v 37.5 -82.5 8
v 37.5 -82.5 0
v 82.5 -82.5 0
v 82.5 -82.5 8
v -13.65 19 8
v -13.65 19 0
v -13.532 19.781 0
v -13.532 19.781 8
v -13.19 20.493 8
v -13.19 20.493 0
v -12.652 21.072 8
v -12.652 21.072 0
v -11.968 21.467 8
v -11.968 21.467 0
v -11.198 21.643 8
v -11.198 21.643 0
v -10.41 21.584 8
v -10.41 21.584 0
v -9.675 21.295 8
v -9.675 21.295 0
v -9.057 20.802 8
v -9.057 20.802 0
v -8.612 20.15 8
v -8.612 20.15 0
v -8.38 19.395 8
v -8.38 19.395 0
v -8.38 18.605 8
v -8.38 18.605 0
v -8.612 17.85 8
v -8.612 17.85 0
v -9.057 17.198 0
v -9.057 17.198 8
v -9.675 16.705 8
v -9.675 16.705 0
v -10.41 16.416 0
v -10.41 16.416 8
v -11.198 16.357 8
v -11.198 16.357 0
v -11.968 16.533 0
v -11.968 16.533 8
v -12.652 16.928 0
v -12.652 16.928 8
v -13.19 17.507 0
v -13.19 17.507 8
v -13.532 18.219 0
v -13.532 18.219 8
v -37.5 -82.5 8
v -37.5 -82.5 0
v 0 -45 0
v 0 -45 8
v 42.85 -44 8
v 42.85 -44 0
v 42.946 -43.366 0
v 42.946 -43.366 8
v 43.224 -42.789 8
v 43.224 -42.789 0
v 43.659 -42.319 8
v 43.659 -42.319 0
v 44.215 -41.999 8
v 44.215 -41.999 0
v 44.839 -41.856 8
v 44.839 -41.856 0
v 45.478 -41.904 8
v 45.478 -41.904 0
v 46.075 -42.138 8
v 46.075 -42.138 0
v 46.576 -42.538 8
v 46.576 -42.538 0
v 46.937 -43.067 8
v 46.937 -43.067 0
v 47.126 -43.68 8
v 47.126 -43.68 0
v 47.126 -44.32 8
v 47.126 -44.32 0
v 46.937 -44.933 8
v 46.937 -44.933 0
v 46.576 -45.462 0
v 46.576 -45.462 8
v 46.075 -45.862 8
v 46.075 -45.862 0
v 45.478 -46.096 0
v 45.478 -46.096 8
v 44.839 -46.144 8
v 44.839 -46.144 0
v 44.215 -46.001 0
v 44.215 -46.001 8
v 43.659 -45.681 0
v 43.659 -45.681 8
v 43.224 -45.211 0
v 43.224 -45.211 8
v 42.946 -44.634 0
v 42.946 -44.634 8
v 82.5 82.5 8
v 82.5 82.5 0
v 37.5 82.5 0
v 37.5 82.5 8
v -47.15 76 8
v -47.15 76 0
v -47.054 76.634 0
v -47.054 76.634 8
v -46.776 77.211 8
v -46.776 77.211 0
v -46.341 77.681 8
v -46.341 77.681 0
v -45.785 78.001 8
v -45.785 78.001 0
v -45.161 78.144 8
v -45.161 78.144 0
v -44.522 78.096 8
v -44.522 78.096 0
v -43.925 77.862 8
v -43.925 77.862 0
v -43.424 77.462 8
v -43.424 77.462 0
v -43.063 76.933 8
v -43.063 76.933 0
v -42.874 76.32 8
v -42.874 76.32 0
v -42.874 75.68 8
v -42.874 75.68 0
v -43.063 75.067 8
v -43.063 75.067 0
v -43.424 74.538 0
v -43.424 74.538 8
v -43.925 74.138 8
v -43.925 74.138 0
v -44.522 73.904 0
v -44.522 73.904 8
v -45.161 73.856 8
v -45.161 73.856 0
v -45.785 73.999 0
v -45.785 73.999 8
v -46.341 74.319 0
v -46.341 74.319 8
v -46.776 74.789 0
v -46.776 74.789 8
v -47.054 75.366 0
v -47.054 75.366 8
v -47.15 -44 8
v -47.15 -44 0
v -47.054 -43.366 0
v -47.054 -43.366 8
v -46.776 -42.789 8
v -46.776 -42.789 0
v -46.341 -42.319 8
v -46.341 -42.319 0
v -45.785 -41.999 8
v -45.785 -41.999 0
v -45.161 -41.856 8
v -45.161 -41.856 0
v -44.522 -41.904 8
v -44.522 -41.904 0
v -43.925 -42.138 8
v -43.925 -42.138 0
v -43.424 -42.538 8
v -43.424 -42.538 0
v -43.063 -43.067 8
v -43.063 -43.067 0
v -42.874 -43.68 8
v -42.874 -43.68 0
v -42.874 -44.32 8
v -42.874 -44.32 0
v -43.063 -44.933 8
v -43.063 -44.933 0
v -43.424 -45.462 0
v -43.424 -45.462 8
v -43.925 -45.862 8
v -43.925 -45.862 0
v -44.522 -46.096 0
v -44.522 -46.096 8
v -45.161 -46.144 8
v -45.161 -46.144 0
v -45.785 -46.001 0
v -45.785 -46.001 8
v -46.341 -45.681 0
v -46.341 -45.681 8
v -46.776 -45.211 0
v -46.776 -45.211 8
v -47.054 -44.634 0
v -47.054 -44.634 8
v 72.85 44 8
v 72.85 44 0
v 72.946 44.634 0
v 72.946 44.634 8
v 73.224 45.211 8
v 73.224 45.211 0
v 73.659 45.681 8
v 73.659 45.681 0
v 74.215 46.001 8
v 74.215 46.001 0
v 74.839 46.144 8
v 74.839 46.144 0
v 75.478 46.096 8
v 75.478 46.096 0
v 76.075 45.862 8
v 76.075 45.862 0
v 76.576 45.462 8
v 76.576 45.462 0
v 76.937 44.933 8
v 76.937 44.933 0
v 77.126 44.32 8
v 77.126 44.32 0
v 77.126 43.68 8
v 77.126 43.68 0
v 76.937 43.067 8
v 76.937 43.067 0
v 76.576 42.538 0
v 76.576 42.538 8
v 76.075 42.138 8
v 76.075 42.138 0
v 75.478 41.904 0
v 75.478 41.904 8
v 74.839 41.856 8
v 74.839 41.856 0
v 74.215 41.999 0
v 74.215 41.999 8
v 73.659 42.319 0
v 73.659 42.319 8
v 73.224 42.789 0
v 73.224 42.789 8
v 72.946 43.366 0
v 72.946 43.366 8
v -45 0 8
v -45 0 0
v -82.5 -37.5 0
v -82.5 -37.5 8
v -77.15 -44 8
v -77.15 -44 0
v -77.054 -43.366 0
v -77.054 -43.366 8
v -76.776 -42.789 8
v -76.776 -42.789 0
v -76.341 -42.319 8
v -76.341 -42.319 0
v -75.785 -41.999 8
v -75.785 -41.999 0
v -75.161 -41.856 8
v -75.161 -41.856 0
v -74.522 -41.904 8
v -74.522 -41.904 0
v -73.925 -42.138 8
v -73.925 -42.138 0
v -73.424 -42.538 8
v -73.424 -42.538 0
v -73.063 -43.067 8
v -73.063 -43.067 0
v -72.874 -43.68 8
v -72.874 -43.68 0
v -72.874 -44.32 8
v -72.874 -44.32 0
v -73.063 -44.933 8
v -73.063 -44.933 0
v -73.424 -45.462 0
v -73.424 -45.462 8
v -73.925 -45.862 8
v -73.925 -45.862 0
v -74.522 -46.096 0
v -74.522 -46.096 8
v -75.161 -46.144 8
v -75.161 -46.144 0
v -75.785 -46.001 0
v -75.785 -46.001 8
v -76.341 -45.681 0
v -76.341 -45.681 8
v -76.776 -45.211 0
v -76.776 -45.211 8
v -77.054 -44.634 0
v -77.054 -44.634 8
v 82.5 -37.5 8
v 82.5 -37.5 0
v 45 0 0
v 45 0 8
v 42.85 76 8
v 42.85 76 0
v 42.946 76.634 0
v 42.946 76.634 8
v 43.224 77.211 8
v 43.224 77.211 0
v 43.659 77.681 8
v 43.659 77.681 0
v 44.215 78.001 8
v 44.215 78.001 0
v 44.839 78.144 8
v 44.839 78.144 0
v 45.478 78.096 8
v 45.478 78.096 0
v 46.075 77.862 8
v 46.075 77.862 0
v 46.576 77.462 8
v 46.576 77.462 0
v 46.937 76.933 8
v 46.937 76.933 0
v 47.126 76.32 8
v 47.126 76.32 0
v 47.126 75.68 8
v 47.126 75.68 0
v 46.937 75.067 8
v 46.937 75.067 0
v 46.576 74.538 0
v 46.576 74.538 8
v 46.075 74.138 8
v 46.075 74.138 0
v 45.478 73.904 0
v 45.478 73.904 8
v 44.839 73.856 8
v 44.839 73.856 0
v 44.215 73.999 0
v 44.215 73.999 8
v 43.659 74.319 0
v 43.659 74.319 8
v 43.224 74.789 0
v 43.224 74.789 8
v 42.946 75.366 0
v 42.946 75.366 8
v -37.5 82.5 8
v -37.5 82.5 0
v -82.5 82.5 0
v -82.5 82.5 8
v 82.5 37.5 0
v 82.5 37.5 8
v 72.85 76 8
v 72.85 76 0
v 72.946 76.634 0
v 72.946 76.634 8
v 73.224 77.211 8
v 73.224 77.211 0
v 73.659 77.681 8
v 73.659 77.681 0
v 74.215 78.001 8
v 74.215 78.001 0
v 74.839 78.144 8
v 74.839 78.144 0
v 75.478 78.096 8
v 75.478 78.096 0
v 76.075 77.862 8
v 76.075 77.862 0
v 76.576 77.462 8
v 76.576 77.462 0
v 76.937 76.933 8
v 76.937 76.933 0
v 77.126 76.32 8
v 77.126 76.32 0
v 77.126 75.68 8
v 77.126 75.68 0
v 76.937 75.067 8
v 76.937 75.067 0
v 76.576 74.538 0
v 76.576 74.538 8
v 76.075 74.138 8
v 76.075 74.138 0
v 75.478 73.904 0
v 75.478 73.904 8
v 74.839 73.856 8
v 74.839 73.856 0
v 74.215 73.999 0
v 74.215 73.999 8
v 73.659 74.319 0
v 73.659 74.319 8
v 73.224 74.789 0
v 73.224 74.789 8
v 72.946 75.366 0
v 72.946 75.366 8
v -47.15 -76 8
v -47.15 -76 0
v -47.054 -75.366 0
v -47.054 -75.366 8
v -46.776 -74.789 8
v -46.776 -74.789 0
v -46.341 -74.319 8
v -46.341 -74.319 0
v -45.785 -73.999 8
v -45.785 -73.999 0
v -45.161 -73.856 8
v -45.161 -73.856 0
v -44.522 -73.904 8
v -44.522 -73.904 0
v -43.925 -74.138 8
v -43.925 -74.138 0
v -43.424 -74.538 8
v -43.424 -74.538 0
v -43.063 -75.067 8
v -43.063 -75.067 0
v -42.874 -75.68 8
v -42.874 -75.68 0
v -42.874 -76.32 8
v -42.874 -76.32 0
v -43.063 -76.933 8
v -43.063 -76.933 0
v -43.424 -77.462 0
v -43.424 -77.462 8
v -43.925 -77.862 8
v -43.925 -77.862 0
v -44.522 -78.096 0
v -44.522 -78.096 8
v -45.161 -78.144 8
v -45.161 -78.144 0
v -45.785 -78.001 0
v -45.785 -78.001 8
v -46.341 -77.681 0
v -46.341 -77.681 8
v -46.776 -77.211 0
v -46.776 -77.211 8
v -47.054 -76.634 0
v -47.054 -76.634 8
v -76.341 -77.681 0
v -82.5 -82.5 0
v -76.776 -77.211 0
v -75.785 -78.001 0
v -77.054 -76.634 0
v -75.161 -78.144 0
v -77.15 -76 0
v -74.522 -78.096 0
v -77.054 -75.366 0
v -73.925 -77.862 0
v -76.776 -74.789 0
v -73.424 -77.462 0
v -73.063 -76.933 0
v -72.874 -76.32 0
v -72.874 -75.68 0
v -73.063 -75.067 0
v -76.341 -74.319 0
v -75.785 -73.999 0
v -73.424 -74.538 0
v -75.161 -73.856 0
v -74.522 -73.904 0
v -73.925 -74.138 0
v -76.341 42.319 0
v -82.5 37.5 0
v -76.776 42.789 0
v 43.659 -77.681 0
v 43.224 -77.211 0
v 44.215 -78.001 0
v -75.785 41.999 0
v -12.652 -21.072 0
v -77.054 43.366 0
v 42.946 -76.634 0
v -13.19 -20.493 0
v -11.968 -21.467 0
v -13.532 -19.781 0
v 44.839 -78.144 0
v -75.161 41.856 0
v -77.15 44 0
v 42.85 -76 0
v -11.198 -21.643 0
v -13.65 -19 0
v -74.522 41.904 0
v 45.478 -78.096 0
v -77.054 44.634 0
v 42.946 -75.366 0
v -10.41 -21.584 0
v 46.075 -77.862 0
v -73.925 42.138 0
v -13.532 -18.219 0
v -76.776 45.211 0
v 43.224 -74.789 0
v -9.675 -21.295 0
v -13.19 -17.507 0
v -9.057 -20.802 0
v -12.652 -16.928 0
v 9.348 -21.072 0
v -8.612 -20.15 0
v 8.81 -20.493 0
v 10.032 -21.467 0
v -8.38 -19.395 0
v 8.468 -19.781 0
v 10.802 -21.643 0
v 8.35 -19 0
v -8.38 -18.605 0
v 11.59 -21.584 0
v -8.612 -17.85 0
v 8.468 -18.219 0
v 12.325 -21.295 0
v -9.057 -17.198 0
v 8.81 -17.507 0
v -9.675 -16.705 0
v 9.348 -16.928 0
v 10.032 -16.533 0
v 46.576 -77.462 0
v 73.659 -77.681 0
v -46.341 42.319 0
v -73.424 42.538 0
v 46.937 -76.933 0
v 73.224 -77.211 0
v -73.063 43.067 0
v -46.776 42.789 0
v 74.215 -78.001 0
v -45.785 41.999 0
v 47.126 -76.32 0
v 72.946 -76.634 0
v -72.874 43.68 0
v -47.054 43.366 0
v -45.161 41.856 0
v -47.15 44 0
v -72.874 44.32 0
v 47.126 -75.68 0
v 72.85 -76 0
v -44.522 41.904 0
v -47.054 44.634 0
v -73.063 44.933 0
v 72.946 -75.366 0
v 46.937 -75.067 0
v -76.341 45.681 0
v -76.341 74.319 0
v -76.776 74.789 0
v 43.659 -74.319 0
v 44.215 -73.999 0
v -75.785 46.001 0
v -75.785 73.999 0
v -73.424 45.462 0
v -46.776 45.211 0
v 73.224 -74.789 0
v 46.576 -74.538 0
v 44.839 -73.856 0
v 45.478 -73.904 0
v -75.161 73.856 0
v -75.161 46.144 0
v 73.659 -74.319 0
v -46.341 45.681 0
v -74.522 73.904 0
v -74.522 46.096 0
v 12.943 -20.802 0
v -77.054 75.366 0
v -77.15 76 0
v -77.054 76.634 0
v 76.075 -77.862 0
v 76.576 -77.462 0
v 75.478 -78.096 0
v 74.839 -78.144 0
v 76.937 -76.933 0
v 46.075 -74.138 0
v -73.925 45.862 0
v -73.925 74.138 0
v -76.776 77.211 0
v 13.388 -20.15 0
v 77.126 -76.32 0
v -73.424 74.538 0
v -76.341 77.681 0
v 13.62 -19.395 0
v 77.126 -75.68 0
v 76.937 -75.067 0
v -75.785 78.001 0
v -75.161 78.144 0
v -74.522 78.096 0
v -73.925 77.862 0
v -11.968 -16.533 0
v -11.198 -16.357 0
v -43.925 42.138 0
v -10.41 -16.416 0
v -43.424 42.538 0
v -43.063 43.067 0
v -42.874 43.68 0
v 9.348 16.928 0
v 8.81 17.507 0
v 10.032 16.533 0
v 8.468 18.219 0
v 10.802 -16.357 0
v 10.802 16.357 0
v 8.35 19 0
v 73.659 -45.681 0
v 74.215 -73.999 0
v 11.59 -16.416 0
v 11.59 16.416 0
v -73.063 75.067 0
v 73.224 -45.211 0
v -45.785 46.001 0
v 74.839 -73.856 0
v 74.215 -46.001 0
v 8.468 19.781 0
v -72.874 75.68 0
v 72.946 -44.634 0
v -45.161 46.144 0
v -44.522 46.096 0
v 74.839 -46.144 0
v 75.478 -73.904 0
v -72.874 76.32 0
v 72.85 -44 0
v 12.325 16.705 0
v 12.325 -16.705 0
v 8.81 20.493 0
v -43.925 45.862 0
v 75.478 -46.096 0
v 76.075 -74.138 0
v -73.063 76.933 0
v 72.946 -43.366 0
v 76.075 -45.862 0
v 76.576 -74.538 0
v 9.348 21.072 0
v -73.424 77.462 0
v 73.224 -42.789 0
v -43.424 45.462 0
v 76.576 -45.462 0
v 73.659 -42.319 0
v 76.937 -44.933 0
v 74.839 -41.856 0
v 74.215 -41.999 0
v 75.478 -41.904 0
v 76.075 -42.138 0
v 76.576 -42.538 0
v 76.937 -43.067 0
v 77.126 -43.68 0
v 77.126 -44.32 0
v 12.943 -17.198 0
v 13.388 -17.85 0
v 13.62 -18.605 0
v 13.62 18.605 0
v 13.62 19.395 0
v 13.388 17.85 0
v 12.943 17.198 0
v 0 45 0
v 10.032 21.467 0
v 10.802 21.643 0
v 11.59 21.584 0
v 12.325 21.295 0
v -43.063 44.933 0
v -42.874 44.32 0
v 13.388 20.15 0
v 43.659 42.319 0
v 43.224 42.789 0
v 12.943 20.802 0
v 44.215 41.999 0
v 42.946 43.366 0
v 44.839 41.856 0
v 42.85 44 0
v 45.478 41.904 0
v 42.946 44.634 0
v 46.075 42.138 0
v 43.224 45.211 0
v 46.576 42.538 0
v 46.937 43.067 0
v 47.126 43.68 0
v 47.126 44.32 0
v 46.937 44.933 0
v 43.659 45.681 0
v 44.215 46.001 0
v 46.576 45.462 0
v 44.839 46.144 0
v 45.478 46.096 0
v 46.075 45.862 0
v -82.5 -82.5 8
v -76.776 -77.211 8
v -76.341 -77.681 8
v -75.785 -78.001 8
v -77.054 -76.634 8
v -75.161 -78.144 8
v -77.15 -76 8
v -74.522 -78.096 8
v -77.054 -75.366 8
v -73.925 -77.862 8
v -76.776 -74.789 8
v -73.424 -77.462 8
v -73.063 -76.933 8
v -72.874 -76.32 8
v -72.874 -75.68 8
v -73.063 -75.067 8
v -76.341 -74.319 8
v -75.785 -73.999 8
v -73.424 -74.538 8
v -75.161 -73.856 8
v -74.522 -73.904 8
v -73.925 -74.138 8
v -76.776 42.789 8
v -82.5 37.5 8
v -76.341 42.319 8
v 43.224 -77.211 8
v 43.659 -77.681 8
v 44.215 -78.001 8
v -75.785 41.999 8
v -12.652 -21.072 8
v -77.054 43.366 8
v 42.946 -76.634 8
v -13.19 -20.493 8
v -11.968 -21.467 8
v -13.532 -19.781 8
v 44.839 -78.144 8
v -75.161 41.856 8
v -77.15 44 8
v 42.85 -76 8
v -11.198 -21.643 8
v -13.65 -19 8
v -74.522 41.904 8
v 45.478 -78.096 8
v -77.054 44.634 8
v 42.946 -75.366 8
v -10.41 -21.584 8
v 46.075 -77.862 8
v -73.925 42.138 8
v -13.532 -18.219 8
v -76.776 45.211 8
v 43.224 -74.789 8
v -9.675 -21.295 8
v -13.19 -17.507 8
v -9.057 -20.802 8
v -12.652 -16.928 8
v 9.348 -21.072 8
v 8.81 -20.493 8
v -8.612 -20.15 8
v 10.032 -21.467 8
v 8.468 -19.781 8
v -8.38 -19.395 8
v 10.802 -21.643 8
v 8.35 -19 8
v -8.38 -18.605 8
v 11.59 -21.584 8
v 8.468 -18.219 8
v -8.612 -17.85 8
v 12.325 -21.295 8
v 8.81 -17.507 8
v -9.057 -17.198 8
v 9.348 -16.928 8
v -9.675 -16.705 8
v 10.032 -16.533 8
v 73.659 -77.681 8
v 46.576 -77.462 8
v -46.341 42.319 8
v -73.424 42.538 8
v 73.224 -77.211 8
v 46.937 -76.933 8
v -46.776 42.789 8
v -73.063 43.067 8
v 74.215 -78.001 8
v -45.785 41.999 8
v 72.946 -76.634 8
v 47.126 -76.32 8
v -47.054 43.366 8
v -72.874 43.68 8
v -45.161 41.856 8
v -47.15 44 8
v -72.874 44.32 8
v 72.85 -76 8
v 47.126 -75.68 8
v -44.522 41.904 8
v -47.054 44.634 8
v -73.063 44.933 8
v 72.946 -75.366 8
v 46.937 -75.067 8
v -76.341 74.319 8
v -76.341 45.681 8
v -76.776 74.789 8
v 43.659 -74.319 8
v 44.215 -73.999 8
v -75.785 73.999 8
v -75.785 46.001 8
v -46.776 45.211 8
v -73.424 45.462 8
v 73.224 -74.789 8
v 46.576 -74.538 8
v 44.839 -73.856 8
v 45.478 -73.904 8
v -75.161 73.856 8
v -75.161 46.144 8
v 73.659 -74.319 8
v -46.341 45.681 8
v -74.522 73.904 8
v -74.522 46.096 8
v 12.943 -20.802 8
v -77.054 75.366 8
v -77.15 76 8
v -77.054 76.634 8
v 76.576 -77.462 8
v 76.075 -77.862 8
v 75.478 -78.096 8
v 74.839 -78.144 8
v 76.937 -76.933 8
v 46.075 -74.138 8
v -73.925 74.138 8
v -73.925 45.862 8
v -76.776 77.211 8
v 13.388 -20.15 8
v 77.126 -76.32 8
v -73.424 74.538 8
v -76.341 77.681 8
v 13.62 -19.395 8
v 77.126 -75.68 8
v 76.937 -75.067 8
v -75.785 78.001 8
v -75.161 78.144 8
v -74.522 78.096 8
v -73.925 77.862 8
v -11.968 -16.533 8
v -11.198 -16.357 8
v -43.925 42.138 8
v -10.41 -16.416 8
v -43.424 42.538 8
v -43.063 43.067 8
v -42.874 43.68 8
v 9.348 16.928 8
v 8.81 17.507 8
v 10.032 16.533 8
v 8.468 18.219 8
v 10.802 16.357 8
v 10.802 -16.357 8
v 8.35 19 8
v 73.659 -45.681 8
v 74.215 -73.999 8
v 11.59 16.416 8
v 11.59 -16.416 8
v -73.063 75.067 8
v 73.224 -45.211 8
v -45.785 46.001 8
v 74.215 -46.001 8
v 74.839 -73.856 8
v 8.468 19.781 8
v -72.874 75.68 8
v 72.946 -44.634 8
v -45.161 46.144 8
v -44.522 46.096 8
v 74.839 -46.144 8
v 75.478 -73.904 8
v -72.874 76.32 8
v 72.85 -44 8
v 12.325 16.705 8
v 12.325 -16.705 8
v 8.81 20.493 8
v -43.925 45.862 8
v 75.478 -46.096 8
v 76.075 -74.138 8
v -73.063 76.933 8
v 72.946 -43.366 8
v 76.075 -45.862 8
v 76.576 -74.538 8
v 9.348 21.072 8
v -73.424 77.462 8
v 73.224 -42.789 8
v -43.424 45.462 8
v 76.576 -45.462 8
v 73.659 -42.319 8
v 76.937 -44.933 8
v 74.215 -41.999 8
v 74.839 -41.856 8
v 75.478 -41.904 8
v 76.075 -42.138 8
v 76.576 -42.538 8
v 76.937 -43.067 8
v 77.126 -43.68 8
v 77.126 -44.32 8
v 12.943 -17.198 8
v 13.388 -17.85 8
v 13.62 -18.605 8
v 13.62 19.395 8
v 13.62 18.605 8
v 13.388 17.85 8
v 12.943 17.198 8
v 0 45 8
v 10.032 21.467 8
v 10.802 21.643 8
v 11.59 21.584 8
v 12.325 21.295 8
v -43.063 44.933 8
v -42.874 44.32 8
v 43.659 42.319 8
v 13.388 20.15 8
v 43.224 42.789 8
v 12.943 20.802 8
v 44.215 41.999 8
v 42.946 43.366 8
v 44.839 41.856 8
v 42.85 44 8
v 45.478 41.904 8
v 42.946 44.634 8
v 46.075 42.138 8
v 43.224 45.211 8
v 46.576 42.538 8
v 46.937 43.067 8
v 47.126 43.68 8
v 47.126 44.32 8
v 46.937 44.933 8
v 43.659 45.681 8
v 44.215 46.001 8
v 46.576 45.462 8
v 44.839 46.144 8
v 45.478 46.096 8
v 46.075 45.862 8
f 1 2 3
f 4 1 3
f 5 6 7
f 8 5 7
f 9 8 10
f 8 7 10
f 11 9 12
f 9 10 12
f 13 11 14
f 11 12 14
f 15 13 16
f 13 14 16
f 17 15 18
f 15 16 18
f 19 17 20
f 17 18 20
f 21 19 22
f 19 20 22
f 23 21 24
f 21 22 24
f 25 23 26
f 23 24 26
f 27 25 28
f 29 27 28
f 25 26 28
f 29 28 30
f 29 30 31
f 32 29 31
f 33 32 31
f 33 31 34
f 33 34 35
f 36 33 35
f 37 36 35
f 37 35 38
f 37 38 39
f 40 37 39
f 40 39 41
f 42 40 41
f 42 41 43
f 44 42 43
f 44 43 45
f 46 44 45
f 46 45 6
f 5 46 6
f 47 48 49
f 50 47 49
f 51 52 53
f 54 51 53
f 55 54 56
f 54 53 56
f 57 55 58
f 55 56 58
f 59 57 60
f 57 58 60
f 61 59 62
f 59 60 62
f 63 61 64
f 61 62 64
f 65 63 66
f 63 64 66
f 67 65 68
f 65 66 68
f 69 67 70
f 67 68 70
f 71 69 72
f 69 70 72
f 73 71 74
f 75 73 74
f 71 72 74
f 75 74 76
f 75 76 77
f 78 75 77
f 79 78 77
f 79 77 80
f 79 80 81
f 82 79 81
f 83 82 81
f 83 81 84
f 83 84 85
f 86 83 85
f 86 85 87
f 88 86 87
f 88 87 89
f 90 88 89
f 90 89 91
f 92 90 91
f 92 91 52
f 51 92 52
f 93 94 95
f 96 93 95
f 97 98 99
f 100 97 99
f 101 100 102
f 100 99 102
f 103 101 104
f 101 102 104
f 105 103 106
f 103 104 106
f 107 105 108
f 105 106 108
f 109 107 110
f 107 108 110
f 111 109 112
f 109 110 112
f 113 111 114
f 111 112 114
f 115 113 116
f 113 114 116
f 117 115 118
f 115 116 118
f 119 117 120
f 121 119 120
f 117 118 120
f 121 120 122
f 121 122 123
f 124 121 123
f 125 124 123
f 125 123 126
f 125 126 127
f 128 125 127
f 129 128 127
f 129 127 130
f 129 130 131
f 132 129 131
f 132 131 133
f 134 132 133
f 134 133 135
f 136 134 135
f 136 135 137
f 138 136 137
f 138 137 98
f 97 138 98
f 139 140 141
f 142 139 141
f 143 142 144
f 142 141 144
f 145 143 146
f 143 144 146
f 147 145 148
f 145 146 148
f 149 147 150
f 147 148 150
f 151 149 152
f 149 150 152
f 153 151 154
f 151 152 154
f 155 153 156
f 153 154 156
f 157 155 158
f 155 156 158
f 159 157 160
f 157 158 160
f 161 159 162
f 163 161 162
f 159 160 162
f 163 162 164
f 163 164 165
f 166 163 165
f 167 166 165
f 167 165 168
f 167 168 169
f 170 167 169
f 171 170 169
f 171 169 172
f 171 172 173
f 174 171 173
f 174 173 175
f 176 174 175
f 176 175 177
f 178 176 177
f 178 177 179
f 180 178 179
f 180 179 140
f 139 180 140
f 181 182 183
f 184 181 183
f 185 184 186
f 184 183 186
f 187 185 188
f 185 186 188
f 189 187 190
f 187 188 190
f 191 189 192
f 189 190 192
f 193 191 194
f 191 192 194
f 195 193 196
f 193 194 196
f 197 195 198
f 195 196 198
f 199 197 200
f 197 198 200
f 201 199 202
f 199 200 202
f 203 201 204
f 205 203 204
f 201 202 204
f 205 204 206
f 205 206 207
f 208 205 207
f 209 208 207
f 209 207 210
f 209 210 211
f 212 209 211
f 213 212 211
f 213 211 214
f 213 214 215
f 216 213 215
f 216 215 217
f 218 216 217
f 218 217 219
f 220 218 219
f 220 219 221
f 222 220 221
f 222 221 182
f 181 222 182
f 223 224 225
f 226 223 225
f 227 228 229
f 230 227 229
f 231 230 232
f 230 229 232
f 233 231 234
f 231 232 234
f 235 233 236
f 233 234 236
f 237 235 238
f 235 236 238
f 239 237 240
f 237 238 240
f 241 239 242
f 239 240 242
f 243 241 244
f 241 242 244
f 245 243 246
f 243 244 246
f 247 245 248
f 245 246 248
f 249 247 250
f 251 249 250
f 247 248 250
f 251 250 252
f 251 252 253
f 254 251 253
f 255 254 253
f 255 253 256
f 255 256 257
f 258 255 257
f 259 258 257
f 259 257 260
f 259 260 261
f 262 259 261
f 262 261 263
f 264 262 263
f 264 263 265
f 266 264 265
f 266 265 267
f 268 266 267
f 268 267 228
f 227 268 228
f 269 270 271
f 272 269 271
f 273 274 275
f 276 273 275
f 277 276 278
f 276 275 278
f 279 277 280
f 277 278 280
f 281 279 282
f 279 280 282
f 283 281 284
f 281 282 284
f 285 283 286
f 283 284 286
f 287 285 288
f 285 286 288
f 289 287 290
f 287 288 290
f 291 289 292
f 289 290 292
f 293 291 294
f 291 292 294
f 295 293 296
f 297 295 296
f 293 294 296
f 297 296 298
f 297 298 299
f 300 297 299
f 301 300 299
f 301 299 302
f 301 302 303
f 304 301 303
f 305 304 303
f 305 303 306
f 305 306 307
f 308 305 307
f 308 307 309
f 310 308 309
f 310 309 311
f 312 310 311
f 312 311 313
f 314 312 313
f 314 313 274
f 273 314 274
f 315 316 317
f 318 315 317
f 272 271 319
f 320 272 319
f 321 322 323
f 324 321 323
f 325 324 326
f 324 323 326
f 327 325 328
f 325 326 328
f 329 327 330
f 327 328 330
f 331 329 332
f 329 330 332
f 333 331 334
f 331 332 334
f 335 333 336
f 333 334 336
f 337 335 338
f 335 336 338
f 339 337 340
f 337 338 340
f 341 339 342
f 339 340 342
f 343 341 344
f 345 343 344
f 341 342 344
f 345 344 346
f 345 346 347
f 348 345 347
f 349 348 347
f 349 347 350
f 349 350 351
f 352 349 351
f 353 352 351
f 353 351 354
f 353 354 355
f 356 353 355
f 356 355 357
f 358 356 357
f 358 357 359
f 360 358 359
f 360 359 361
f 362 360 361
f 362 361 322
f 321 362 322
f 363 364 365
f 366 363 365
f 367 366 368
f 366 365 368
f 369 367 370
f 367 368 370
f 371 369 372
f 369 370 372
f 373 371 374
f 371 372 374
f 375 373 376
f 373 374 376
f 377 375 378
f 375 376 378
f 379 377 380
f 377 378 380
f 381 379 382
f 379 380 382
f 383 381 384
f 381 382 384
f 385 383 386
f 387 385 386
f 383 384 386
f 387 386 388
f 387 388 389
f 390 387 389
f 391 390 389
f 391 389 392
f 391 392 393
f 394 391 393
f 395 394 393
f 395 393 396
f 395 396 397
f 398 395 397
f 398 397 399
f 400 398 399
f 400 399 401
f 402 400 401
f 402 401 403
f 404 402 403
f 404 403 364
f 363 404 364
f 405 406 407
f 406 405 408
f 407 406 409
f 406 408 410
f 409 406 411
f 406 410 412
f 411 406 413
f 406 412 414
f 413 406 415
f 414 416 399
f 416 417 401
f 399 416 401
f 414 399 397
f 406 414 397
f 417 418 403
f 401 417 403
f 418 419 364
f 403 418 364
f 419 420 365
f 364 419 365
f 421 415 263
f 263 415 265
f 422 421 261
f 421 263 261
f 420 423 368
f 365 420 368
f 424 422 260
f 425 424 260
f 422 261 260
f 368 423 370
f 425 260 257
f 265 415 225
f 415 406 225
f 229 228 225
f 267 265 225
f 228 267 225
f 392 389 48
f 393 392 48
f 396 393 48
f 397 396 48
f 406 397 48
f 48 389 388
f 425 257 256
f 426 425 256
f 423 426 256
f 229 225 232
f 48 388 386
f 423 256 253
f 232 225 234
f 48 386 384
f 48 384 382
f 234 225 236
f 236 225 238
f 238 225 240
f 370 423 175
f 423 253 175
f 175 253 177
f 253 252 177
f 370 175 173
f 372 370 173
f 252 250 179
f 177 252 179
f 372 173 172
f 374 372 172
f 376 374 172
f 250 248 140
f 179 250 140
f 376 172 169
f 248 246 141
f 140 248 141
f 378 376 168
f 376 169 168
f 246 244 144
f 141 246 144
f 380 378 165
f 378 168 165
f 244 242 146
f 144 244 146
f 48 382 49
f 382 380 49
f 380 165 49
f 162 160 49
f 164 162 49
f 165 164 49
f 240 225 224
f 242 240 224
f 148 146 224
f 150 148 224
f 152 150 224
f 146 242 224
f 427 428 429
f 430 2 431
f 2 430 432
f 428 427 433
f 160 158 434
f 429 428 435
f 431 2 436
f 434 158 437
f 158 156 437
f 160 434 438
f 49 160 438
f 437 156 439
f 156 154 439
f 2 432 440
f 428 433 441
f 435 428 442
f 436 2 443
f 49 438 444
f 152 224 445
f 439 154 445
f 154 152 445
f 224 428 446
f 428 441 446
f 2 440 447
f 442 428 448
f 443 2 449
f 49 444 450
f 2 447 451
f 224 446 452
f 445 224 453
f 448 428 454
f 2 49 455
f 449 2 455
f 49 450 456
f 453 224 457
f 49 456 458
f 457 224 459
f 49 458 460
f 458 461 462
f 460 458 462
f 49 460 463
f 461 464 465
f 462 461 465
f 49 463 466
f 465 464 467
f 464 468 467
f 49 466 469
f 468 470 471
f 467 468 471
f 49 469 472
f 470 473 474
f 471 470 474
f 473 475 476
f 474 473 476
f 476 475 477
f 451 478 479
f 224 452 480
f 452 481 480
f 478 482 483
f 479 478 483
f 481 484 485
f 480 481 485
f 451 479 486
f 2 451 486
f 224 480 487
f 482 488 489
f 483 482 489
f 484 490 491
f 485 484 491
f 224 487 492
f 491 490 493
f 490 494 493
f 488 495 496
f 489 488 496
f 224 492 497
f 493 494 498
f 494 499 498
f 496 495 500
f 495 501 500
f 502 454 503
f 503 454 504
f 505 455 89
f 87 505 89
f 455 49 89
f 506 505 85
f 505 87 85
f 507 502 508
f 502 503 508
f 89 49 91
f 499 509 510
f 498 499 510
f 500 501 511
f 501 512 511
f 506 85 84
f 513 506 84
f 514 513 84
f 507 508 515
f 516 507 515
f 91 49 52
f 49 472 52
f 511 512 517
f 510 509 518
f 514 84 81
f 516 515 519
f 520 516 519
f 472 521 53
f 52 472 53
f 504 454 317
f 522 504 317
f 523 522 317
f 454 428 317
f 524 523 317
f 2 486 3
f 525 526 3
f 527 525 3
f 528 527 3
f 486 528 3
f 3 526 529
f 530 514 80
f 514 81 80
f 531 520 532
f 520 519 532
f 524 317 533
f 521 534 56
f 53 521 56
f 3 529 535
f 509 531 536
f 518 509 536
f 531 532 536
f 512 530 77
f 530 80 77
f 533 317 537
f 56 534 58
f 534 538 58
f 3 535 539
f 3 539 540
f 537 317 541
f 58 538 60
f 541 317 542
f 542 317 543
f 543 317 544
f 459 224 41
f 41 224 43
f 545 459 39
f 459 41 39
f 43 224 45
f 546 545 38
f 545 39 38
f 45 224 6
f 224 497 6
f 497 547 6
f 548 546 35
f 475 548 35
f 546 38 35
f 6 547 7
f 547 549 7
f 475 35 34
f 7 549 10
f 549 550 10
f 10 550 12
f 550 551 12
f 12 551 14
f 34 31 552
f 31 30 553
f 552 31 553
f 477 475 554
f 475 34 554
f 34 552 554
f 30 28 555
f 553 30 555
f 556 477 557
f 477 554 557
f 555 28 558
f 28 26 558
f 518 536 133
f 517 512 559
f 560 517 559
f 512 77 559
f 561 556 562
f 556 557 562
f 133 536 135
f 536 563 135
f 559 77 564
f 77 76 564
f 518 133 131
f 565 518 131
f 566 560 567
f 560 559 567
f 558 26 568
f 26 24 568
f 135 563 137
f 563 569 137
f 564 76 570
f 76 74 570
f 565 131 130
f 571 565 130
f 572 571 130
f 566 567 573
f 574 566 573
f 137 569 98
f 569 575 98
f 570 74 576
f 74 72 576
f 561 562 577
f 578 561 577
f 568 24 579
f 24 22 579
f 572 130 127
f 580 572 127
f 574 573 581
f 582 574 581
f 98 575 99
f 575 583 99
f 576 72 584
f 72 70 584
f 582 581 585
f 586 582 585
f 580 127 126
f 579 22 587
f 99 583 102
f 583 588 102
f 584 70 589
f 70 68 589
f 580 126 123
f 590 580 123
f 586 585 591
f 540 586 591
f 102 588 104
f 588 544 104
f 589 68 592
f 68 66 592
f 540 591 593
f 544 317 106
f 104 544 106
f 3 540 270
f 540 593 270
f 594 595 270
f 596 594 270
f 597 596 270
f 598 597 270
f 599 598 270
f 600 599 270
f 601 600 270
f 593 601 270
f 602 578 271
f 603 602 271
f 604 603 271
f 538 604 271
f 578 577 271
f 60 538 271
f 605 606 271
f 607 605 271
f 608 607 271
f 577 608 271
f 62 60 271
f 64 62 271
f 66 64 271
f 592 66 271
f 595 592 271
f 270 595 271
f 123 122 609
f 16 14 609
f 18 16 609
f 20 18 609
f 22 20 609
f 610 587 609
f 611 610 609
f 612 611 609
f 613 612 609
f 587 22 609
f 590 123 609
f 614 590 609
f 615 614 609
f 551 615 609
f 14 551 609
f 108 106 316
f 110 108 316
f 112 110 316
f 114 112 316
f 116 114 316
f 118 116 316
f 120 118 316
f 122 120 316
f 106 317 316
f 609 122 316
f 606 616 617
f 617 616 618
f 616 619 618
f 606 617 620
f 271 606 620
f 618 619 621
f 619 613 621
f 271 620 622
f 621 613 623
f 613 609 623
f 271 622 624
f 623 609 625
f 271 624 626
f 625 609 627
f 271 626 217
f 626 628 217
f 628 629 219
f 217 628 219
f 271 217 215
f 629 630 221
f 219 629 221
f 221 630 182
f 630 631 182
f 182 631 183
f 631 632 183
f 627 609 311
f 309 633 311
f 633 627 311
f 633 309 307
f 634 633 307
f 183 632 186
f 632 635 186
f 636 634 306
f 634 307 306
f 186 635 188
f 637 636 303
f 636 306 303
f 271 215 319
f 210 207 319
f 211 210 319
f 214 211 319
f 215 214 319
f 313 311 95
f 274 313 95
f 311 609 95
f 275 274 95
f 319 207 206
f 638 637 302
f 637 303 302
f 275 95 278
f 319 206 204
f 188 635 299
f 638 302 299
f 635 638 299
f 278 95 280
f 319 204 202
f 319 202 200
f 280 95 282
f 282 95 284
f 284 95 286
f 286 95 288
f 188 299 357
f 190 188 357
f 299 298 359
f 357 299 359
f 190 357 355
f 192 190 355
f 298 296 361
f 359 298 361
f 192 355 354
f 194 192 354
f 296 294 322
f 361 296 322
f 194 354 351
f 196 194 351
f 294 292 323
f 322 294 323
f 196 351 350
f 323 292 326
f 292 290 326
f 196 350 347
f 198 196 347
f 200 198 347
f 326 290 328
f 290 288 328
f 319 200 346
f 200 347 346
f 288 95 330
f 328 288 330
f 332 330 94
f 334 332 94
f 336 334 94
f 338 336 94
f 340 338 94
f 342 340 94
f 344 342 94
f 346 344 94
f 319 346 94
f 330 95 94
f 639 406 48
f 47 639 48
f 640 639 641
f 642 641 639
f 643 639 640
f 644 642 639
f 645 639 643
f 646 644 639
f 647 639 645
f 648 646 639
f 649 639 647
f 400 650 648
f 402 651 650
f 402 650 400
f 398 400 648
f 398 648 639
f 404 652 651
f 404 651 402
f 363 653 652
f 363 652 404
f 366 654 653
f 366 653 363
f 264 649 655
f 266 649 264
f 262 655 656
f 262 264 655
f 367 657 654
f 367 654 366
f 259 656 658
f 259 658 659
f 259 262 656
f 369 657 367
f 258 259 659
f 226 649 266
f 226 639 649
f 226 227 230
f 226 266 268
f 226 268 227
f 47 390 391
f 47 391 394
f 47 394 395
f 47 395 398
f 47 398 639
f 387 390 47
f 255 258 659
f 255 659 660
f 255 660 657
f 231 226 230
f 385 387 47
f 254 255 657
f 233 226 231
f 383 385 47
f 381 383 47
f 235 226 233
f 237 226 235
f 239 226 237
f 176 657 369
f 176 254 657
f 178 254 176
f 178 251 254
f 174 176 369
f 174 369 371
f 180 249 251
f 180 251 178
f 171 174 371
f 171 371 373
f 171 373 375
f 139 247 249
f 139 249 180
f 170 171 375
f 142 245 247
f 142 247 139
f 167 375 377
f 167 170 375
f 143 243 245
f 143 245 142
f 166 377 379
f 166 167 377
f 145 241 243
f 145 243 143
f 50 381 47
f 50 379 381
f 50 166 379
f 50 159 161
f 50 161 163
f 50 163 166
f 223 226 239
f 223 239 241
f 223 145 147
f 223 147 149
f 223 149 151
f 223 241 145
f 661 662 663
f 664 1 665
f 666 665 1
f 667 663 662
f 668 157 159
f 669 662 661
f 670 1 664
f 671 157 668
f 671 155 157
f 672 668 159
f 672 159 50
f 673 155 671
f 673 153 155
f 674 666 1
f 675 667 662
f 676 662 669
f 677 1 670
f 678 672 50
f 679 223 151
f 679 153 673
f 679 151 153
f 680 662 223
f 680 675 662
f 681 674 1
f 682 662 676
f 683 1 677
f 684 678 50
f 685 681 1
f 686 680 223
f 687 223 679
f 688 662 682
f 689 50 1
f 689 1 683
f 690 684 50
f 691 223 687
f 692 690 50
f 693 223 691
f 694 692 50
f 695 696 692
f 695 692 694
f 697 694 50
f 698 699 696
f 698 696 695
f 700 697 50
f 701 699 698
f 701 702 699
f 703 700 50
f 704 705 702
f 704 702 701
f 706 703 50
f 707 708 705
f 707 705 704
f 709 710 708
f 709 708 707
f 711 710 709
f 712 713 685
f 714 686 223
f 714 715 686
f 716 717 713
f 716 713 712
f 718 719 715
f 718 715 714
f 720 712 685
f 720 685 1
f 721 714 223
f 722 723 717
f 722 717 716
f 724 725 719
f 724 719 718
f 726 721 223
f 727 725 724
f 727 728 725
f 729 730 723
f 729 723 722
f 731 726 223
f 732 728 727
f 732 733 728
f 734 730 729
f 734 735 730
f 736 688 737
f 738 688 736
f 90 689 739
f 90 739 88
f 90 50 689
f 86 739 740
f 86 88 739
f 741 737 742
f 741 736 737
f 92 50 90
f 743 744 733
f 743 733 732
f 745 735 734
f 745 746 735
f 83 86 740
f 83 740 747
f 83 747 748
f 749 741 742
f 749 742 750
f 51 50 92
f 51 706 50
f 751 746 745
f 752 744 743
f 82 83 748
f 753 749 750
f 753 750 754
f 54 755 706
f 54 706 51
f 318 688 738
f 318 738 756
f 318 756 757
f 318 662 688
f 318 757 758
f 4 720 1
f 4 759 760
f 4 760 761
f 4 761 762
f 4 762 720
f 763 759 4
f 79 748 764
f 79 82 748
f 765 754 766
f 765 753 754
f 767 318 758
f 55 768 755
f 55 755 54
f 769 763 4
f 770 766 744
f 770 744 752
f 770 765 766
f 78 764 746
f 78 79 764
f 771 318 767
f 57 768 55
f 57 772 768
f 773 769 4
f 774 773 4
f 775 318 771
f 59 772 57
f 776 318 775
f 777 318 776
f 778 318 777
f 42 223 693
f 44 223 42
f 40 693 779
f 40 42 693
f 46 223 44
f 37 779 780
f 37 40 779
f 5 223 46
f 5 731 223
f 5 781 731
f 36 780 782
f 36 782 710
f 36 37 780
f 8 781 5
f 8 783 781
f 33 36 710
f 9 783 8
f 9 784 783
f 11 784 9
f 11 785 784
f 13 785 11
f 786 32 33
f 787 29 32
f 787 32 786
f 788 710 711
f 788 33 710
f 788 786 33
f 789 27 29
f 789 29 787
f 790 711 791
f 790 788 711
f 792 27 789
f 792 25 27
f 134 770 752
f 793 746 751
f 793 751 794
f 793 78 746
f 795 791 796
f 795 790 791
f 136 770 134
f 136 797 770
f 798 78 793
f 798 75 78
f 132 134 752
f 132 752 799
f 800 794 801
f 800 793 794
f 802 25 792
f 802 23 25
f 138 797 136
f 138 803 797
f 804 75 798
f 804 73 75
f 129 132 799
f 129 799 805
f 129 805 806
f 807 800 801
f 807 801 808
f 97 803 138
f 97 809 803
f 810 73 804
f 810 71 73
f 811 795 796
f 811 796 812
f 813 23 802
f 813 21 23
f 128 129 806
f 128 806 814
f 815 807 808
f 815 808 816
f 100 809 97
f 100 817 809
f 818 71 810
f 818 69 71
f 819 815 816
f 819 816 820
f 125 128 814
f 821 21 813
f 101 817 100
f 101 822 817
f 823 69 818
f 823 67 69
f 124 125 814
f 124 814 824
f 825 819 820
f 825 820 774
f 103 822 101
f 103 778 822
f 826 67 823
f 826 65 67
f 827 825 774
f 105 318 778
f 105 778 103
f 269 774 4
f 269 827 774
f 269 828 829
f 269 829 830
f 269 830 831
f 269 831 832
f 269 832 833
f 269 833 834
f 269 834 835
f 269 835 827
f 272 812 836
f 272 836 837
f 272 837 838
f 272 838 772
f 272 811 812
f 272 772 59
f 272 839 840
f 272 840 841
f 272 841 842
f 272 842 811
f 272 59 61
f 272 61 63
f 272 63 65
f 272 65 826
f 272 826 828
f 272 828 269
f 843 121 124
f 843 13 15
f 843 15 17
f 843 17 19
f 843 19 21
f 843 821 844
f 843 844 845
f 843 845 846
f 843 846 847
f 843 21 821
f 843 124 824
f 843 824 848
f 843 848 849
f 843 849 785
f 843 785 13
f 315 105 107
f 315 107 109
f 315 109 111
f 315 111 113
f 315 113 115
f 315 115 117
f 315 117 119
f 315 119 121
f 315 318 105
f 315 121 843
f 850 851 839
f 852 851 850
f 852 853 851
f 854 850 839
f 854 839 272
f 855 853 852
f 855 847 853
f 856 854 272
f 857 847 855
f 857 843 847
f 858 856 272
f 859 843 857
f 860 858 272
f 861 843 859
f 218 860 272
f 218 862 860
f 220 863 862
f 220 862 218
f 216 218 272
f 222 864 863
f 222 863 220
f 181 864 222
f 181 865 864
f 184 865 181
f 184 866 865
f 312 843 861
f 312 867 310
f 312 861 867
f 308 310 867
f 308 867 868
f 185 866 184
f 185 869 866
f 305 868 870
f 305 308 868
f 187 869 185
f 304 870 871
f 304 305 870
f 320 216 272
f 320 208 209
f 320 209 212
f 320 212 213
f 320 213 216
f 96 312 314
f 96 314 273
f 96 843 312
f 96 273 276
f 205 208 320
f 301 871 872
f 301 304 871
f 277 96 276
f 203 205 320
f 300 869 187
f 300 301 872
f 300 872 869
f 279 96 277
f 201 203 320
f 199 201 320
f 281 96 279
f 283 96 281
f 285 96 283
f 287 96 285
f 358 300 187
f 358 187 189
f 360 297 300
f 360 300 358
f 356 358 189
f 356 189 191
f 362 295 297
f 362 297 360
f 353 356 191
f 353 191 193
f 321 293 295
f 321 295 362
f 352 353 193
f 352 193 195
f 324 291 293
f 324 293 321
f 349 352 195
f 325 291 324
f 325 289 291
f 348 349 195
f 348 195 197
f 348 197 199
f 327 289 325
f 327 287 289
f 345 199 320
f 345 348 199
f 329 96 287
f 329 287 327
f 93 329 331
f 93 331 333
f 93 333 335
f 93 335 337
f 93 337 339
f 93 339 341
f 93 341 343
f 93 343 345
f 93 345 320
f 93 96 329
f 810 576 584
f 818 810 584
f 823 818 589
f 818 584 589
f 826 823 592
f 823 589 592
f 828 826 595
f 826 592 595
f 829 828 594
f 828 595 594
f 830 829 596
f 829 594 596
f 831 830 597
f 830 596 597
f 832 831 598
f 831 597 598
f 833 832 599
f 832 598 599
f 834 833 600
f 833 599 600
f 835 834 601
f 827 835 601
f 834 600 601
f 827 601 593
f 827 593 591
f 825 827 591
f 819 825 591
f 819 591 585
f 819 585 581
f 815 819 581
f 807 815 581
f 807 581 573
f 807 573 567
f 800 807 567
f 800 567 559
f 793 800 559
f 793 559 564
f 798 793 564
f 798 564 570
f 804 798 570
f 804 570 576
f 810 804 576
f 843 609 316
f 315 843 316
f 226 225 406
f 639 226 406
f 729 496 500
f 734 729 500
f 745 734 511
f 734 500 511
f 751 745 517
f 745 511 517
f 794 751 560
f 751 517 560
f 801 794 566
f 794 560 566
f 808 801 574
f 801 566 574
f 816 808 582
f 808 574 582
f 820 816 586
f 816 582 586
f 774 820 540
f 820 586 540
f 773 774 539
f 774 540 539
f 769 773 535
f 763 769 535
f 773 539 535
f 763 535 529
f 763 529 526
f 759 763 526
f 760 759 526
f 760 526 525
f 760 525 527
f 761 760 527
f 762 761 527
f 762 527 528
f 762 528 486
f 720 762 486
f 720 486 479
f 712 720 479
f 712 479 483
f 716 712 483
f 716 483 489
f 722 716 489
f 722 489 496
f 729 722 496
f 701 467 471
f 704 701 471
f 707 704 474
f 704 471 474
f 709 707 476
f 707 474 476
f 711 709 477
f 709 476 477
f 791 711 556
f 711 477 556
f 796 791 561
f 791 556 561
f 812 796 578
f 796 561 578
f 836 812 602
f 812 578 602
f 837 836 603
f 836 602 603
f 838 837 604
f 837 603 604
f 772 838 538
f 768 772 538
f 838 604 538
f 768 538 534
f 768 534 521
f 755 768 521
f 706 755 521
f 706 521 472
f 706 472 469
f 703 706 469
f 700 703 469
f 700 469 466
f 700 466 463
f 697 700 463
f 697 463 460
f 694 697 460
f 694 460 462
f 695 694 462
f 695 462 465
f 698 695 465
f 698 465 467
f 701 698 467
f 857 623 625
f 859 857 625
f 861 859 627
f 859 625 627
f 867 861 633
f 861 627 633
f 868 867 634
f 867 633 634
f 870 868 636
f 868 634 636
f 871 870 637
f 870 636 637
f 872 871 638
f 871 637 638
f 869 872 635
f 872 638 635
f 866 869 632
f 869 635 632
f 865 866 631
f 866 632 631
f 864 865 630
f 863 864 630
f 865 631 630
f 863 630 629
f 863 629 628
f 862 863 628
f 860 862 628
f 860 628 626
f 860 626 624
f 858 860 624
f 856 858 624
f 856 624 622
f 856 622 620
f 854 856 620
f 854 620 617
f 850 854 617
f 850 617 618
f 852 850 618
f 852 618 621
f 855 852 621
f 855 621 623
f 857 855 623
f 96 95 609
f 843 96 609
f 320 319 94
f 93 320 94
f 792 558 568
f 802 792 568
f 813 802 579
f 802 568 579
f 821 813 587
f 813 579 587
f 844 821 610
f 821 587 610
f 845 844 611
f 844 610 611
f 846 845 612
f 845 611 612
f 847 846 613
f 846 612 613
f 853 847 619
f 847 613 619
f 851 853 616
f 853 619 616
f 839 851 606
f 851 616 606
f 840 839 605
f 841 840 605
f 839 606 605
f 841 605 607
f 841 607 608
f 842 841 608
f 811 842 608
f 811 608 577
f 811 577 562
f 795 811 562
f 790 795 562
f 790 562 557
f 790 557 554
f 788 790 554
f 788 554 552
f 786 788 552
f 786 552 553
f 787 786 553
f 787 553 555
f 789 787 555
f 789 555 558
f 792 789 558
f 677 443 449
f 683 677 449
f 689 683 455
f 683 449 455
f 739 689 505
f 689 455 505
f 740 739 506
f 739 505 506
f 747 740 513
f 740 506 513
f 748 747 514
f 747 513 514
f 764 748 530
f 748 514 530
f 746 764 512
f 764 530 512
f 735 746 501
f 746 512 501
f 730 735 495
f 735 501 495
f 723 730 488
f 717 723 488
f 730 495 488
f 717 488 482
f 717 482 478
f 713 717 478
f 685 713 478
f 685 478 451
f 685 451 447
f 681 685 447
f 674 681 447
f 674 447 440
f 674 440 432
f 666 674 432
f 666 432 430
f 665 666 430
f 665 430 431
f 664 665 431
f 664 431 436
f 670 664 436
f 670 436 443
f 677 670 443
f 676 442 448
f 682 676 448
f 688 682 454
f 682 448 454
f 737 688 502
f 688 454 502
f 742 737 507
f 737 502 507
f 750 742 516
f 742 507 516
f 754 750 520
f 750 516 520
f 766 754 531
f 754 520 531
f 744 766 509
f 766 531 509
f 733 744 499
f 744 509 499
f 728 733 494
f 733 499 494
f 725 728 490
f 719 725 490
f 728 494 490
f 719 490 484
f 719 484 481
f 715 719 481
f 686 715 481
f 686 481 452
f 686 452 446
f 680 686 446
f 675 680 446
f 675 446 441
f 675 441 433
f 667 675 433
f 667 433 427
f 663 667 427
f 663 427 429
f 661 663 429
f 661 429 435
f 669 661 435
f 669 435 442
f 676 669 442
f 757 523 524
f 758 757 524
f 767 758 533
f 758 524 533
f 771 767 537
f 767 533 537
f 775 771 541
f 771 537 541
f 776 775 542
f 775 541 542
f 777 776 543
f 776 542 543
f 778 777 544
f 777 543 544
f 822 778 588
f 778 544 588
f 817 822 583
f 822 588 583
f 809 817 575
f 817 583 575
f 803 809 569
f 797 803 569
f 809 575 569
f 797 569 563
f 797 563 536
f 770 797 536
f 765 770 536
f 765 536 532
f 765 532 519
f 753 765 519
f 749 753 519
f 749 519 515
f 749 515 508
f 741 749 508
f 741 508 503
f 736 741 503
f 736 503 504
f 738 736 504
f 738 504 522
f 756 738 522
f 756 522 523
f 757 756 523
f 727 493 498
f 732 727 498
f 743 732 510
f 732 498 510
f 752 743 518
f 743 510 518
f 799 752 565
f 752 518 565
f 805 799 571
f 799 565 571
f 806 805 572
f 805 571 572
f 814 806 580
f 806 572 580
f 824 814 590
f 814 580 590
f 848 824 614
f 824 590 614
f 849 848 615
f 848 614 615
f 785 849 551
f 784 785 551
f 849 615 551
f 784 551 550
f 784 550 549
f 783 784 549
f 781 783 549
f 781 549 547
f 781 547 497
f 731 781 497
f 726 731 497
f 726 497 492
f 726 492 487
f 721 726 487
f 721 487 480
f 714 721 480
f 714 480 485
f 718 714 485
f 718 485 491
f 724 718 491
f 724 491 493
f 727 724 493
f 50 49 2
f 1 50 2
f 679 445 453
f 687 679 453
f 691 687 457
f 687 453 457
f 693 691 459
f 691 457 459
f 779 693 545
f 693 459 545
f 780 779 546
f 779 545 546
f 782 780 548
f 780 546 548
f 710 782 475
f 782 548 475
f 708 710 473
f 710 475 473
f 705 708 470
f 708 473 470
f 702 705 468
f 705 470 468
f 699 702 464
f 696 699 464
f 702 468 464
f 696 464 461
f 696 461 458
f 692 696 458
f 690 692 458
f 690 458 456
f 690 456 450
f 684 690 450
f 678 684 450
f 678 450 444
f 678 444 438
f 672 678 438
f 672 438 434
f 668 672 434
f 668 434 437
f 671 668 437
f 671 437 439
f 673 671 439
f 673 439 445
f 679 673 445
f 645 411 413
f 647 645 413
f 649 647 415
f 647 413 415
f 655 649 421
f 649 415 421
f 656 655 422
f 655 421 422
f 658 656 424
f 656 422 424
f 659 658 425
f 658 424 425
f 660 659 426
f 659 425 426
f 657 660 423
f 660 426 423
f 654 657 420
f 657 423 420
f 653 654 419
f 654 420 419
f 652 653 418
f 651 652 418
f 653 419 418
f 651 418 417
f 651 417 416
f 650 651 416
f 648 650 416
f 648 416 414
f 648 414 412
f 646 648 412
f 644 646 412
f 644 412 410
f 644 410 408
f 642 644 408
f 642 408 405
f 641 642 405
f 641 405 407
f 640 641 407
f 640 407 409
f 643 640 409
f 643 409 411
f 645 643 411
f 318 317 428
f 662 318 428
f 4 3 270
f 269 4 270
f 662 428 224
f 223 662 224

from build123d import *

# Parameters (mm, degrees)
BOSS_EXTRUDE1_DEPTH  = 8
M4_CLEARANCE_HOLE1_D = 4.3
M5_CLEARANCE_HOLE1_D = 5.3


with BuildPart() as part:
    # Sketch1 → Boss-Extrude1 (new body)
    with BuildSketch(Plane.XY):
        Polygon((-82.5, 37.5), (-45, 0), (-82.5, -37.5), (-82.5, -82.5), (-37.5, -82.5), (0, -45), (37.5, -82.5), (82.5, -82.5), (82.5, -37.5), (45, 0), (82.5, 37.5), (82.5, 82.5), (37.5, 82.5), (0, 45), (-37.5, 82.5), (-82.5, 82.5), align=None)
    extrude(amount=BOSS_EXTRUDE1_DEPTH)

    # M4 Clearance Hole1 (through all)
    with Locations(Plane.XY.offset(8)):
        with Locations((-75, 76), (-45, 76), (-45, 44), (-75, 44), (-75, -44), (-45, -44), (-45, -76), (-75, -76), (75, -76), (45, -76), (45, -44), (75, -44), (75, 44), (45, 44), (45, 76), (75, 76)):
            Hole(M4_CLEARANCE_HOLE1_D / 2)

    # M5 Clearance Hole1 (through all)
    with Locations(Plane.XY.offset(8)):
        with Locations((-11, 19), (-11, -19), (11, -19), (11, 19)):
            Hole(M5_CLEARANCE_HOLE1_D / 2)


solid = part.part
